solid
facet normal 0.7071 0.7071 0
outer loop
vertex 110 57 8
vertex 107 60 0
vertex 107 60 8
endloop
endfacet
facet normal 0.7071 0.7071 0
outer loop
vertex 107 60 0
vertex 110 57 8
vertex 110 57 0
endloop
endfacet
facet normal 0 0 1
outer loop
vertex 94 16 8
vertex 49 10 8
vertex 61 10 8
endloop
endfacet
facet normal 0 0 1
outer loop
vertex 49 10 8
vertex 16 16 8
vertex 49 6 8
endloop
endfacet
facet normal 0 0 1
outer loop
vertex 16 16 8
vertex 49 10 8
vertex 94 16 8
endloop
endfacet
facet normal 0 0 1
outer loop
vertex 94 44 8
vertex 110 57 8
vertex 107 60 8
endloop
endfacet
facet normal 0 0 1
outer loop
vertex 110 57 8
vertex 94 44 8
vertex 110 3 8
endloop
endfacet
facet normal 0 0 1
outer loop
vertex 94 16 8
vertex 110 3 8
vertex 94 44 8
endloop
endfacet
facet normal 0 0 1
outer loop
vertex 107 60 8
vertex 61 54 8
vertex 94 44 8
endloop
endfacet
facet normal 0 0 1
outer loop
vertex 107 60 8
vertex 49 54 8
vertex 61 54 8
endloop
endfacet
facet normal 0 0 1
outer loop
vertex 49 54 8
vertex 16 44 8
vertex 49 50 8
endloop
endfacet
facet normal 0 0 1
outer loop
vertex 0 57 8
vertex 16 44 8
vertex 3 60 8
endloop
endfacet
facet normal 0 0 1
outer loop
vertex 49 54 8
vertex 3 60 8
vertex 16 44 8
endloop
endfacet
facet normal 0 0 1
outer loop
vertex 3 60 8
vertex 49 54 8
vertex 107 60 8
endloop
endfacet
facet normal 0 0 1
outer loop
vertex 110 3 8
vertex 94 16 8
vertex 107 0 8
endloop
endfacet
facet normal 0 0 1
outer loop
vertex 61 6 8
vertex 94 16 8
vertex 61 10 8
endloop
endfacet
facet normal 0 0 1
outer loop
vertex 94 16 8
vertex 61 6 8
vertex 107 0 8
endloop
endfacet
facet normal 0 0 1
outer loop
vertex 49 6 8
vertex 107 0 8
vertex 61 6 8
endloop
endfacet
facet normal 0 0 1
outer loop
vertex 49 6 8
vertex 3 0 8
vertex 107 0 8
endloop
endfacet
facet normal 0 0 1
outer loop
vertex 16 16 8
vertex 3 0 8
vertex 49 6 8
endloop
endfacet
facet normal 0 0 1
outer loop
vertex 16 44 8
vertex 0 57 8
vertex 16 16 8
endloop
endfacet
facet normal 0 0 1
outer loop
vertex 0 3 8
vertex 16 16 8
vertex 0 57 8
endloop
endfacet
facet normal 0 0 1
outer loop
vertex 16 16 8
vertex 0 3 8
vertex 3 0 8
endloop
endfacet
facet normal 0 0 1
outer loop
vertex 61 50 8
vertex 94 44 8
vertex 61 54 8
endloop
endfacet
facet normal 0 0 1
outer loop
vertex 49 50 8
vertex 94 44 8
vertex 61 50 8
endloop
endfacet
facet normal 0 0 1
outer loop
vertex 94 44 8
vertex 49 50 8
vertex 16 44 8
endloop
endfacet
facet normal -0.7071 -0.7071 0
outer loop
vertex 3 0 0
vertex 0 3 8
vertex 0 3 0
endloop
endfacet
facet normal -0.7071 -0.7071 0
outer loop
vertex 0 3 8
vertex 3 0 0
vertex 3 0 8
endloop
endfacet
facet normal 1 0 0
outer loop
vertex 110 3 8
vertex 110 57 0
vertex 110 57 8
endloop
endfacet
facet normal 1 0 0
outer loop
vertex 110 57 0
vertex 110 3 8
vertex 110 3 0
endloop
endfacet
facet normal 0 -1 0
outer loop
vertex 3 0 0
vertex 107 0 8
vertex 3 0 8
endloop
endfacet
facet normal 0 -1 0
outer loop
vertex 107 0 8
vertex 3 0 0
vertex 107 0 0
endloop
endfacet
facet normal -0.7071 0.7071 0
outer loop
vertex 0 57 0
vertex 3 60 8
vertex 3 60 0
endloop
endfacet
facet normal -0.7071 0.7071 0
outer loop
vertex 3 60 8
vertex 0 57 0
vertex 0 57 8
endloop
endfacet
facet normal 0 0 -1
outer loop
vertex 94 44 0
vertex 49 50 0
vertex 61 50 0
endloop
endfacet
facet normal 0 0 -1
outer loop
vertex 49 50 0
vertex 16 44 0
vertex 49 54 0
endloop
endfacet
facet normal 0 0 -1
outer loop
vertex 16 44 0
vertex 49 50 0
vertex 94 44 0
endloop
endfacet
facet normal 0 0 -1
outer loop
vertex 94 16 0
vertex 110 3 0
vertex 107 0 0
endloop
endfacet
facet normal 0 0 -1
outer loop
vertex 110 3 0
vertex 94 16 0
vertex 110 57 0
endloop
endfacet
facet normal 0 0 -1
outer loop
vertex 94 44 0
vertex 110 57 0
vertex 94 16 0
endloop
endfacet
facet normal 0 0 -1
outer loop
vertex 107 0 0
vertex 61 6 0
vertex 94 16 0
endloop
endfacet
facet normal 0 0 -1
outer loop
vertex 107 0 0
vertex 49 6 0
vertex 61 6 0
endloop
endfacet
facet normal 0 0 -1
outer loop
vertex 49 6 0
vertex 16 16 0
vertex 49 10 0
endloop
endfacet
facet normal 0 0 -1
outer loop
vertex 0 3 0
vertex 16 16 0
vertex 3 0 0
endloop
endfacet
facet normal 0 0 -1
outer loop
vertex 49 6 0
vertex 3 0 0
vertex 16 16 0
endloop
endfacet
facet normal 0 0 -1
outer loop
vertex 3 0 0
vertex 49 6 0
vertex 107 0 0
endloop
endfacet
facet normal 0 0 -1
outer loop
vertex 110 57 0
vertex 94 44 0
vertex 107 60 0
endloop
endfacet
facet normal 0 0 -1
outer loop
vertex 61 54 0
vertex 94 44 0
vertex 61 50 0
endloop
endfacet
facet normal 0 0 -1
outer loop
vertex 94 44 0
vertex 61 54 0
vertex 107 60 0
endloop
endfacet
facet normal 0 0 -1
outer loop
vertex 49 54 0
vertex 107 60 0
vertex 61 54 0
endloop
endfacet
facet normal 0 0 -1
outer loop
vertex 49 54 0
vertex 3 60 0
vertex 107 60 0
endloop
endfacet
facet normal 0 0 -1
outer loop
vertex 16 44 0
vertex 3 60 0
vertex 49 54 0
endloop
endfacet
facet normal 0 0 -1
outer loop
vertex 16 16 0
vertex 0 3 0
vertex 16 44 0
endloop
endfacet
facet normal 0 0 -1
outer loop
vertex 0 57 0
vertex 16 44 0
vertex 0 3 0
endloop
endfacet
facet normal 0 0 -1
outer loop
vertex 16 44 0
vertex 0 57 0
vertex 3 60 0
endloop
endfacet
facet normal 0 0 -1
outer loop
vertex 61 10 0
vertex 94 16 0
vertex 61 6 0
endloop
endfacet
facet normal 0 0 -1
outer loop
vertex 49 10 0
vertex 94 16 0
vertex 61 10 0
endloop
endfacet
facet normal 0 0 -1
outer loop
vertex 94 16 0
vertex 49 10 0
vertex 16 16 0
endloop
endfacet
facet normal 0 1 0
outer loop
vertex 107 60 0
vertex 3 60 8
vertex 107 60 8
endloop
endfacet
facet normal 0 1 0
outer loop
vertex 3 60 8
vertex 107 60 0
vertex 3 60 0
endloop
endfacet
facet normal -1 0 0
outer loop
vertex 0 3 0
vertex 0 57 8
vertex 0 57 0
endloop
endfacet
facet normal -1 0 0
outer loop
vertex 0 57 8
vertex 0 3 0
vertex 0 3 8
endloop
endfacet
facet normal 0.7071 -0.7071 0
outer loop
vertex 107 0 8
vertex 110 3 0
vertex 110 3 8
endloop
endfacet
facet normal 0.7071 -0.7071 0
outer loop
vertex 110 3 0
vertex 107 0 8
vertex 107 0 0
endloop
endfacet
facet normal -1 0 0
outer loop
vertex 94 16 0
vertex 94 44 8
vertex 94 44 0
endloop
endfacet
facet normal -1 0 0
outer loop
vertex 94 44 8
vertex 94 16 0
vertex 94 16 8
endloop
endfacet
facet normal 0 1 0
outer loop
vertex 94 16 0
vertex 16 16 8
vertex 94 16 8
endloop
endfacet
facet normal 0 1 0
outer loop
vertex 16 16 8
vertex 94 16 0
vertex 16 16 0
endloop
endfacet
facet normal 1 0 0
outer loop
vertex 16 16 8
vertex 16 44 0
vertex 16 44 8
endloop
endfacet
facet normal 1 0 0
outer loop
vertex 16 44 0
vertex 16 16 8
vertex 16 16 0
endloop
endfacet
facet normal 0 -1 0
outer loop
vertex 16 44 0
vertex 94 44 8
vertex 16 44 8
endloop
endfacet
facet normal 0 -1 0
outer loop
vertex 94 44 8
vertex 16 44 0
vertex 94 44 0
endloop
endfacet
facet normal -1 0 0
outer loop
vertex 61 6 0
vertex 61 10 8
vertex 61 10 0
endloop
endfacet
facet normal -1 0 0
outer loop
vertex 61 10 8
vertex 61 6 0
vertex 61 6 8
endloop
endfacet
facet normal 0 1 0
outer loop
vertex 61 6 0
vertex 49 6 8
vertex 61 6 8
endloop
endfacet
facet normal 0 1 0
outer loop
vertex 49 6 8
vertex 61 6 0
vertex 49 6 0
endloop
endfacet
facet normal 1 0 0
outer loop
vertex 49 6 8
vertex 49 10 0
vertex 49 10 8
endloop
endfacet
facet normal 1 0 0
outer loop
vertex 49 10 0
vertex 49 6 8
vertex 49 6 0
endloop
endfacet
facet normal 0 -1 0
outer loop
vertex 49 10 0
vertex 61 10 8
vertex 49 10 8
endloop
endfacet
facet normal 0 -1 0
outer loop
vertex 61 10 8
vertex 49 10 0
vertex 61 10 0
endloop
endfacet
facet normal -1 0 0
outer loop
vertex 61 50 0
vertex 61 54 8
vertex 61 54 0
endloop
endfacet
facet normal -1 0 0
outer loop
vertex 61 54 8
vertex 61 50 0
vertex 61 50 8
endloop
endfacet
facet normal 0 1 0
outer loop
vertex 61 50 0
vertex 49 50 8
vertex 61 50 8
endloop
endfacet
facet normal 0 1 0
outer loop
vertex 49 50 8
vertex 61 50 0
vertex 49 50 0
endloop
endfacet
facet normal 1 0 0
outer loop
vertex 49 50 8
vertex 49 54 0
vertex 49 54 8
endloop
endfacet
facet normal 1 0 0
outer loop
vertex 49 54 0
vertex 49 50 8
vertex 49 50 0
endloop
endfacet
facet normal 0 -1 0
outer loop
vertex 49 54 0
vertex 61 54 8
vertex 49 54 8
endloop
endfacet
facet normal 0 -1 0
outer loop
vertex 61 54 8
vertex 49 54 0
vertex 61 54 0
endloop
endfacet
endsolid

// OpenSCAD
$fn = 32;

// ----------------------------------------------------------------------
// Frame plate: 110 x 60 frame, 16 mm rails
// ----------------------------------------------------------------------

// --- parameters (mm) ---
plate_l = 110;            // plate length, X
plate_w = 60;             // plate width, Y
plate_t = 8;              // plate thickness, Z (extrusion height)
corner_c = 3;             // corner chamfer
frame_bar = 16;           // frame rail width
slot_l = 12;              // adjustment slot length
slot_w = 4;               // adjustment slot width

win_l = plate_l - 2 * frame_bar;  // window length
win_w = plate_w - 2 * frame_bar;  // window width

profile = [[3, 0], [107, 0], [110, 3], [110, 57], [107, 60], [3, 60], [0, 57], [0, 3]];  // primary outline, 8 points, counter clockwise
void_1 = [[16, 16], [94, 16], [94, 44], [16, 44]];  // the window, 4 points
void_2 = [[49, 6], [61, 6], [61, 10], [49, 10]];  // adjustment slot, 4 points
void_3 = [[49, 50], [61, 50], [61, 54], [49, 54]];  // adjustment slot, 4 points

// --- the one profile operation ---
difference() {
  linear_extrude(height = plate_t) polygon(points = profile);
  translate([0, 0, -1])
    linear_extrude(height = plate_t + 2) polygon(points = void_1);
  translate([0, 0, -1])
    linear_extrude(height = plate_t + 2) polygon(points = void_2);
  translate([0, 0, -1])
    linear_extrude(height = plate_t + 2) polygon(points = void_3);
}
